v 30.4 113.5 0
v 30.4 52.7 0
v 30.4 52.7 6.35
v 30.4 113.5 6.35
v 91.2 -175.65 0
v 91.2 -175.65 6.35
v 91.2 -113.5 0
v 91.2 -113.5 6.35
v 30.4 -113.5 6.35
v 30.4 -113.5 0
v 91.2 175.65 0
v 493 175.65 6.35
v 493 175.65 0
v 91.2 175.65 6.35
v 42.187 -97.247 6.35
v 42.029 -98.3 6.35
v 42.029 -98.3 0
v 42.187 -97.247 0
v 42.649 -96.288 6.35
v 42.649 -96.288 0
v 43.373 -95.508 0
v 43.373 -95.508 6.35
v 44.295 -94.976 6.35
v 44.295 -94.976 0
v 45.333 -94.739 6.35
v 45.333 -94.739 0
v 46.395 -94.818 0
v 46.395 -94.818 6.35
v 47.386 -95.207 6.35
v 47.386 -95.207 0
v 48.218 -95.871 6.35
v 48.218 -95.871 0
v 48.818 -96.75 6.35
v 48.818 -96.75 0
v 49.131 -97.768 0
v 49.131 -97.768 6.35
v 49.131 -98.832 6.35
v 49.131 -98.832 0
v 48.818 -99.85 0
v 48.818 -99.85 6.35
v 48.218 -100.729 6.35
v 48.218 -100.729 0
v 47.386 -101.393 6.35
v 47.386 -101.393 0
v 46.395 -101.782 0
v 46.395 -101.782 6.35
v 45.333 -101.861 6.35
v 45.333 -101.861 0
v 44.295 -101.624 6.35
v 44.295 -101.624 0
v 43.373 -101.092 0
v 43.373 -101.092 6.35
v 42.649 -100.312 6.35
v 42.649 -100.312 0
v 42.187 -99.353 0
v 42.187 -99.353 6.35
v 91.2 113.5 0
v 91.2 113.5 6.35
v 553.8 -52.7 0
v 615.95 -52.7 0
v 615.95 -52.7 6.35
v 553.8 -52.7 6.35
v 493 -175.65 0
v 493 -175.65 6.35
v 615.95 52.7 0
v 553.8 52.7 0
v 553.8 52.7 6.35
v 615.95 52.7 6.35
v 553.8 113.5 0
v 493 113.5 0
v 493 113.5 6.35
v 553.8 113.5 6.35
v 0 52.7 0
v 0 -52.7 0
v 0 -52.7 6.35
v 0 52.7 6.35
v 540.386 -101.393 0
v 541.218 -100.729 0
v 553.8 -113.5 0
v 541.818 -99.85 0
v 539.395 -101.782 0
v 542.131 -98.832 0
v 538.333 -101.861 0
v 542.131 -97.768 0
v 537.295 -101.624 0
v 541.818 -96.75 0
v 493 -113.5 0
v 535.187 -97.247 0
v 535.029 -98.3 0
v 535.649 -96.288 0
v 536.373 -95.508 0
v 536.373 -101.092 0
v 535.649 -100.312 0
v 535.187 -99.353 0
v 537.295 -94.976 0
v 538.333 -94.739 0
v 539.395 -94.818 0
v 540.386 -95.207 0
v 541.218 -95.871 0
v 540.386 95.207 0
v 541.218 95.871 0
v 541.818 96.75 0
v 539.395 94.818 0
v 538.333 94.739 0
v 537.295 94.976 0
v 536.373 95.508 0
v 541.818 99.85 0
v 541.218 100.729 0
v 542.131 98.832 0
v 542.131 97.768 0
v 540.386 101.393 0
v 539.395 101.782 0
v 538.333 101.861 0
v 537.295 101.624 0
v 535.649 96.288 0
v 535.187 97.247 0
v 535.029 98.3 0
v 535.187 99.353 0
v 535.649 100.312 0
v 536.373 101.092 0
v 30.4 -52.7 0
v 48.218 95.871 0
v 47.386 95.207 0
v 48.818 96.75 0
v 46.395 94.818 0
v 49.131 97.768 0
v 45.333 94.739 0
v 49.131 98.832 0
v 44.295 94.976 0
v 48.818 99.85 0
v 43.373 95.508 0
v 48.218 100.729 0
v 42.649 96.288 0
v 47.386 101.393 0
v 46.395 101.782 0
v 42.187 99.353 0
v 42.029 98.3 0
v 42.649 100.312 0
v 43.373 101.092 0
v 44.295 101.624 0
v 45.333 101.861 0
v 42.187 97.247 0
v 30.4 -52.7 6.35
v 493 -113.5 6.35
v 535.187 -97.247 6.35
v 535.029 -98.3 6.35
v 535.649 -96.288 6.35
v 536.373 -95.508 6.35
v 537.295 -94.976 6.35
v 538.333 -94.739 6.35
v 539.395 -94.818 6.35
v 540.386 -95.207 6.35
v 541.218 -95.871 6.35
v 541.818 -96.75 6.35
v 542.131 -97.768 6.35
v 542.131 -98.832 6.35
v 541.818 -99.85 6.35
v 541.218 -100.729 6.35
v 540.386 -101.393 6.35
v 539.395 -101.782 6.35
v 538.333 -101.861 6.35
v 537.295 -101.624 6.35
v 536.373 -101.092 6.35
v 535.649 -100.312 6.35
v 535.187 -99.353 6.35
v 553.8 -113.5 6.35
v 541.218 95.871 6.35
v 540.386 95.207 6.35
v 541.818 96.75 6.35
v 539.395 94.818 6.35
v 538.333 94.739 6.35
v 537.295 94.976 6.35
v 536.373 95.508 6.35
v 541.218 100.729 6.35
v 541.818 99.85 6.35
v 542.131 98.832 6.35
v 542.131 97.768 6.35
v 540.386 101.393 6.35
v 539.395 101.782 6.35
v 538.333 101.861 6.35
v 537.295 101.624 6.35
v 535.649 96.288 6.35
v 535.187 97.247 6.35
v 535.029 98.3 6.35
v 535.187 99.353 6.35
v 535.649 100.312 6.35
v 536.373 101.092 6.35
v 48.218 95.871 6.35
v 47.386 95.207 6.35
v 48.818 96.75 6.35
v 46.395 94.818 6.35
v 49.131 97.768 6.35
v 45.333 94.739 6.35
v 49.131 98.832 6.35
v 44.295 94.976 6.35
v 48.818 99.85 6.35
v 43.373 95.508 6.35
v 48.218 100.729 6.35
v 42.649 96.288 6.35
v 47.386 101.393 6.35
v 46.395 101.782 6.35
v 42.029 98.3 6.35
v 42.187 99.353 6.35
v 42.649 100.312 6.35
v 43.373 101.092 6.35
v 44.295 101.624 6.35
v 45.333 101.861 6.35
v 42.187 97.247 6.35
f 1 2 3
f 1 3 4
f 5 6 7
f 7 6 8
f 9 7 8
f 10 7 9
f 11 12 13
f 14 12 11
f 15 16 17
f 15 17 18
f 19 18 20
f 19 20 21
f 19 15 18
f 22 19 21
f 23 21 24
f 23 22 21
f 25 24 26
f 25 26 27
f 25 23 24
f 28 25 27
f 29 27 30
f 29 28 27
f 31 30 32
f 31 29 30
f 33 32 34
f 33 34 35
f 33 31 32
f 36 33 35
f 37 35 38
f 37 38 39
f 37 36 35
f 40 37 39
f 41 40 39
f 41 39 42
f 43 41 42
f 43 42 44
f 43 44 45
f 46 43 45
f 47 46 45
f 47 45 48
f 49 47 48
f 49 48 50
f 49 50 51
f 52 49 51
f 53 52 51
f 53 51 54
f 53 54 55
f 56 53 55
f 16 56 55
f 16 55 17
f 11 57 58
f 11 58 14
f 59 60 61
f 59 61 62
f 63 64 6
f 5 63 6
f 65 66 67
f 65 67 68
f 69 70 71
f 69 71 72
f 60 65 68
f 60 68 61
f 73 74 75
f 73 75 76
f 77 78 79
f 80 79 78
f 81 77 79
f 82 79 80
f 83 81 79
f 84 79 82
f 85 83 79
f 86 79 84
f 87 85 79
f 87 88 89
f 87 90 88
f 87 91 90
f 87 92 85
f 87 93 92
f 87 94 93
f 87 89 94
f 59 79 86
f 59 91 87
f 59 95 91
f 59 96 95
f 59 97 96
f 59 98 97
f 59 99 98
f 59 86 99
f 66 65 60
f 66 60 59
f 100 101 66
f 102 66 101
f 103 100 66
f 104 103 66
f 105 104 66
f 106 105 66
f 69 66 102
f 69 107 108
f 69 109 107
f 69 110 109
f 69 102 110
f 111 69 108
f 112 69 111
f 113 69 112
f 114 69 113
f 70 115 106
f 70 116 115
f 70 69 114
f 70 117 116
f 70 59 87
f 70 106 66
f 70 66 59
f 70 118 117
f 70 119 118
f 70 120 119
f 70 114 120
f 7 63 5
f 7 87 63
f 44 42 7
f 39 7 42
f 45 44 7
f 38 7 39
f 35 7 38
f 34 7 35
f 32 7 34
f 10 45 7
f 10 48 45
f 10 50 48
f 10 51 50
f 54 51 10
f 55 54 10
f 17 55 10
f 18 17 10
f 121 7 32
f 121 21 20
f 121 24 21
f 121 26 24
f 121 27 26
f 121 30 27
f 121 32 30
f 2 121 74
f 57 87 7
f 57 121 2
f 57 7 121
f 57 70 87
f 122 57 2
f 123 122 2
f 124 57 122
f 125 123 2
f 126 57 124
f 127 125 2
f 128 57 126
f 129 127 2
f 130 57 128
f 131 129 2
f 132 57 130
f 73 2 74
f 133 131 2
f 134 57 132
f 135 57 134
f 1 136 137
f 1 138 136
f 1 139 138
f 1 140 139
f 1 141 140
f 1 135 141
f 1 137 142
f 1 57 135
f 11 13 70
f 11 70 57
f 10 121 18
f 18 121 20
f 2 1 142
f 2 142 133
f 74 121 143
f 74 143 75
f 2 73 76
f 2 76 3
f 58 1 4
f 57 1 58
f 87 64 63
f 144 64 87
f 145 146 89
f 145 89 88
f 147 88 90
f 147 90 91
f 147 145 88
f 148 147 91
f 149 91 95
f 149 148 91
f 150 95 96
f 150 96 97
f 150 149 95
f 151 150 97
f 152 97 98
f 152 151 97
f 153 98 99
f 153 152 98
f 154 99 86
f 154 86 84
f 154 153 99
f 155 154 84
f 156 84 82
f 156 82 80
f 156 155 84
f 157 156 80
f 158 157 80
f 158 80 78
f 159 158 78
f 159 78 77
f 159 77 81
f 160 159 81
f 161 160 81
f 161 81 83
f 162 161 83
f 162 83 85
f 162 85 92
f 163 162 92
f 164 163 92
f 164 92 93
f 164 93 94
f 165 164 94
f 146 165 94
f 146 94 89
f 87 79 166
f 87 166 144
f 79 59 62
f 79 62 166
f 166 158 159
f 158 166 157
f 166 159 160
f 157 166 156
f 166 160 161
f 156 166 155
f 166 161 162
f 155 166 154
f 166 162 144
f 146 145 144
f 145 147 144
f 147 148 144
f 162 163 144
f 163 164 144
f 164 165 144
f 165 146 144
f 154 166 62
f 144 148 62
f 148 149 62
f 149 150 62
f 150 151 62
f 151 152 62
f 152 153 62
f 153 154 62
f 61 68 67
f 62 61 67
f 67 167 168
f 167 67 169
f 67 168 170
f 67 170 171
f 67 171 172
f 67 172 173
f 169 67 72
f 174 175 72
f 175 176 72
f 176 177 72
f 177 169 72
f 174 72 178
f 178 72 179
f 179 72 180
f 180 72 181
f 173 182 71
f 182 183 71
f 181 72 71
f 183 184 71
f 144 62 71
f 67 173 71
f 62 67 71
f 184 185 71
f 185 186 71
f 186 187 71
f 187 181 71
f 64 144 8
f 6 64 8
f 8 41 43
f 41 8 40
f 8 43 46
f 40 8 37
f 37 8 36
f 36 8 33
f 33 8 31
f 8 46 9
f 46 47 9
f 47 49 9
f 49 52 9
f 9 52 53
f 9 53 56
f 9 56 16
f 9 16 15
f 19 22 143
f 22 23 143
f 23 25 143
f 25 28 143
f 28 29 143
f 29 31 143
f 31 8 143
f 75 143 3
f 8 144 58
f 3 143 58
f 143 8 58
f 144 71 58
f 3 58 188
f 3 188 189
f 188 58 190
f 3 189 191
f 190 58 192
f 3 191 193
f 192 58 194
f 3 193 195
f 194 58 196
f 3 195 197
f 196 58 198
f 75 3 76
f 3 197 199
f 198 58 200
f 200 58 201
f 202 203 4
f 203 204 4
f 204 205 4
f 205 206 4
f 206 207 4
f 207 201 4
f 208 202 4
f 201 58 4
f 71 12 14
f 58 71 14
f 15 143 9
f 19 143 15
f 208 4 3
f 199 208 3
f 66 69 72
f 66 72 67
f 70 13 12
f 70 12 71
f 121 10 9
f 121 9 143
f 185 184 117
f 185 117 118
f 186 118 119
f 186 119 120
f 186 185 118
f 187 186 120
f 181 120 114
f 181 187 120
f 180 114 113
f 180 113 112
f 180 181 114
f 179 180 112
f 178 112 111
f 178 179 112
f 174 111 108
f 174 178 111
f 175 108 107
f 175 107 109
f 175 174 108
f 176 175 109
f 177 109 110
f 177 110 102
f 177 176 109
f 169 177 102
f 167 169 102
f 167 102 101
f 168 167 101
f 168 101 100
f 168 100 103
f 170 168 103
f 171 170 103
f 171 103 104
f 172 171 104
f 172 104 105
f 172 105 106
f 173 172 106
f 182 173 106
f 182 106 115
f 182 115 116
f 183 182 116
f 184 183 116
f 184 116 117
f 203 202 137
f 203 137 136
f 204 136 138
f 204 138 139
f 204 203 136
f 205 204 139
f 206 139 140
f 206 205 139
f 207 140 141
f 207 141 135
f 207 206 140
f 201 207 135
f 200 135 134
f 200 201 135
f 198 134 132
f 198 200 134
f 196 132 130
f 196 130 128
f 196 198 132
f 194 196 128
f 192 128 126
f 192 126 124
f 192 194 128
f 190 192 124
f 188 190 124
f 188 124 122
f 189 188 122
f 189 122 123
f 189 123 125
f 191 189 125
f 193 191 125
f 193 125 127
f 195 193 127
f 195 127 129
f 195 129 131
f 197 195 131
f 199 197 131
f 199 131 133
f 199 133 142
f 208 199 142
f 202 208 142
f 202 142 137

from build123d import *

# Parameters (mm, degrees)
BOSS_EXTRU_1_DEPTH      = 6.35
ESQUISSE2_W             = 401.8
ESQUISSE2_H             = 6.35
ENL_V_MAT_EXTRU_1_DEPTH = 643.307344657
D_GAGEMENT_1_41_D       = 7.14248
ESQUISSE5_W             = 401.8
ESQUISSE5_H             = 1.35
BOSS_EXTRU_2_DEPTH      = 6.35


with BuildPart() as part:
    # Esquisse1 → Boss.-Extru.1 (new body)
    with BuildSketch(Plane.XY):
        Polygon((-615.95, 52.7), (-615.95, -52.7), (-553.8, -52.7), (-553.8, -113.5), (-493, -113.5), (-493, -174.3), (-91.2, -174.3), (-91.2, -113.5), (-30.4, -113.5), (-30.4, -52.7), (0, -52.7), (0, 52.7), (-30.4, 52.7), (-30.4, 113.5), (-91.2, 113.5), (-91.2, 182), (-493, 182), (-493, 113.5), (-553.8, 113.5), (-553.8, 52.7), align=None)
    extrude(amount=BOSS_EXTRU_1_DEPTH)

    # Esquisse2 → Enlèv. mat.-Extru.1 (cut, through all)
    with BuildSketch(Plane.XY.offset(6.35)):
        with Locations((-292.1, 178.825)):
            Rectangle(ESQUISSE2_W, ESQUISSE2_H)
    extrude(amount=-ENL_V_MAT_EXTRU_1_DEPTH, mode=Mode.SUBTRACT)

    # Dégagement 1/41 (through all)
    with Locations(Plane(origin=(0, 0, 0), x_dir=(-1, 0, 0), z_dir=(0, 0, -1))):
        with Locations((45.6, 98.3), (45.6, -98.3), (538.6, -98.3), (538.6, 98.3)):
            Hole(D_GAGEMENT_1_41_D / 2)

    # Esquisse5 → Boss.-Extru.2 (add, through all)
    with BuildSketch(Plane.XY.offset(6.35)):
        with Locations((-292.1, -174.975)):
            Rectangle(ESQUISSE5_W, ESQUISSE5_H)
    extrude(amount=-BOSS_EXTRU_2_DEPTH)


with BuildPart() as body_2:
    # Symétrie1: mirrored copy
    add(part.part.mirror(Plane(origin=(0, -52.7, 6.35), x_dir=(0, 0, 1), z_dir=(-1, 0, 0))))


solid = body_2.part
